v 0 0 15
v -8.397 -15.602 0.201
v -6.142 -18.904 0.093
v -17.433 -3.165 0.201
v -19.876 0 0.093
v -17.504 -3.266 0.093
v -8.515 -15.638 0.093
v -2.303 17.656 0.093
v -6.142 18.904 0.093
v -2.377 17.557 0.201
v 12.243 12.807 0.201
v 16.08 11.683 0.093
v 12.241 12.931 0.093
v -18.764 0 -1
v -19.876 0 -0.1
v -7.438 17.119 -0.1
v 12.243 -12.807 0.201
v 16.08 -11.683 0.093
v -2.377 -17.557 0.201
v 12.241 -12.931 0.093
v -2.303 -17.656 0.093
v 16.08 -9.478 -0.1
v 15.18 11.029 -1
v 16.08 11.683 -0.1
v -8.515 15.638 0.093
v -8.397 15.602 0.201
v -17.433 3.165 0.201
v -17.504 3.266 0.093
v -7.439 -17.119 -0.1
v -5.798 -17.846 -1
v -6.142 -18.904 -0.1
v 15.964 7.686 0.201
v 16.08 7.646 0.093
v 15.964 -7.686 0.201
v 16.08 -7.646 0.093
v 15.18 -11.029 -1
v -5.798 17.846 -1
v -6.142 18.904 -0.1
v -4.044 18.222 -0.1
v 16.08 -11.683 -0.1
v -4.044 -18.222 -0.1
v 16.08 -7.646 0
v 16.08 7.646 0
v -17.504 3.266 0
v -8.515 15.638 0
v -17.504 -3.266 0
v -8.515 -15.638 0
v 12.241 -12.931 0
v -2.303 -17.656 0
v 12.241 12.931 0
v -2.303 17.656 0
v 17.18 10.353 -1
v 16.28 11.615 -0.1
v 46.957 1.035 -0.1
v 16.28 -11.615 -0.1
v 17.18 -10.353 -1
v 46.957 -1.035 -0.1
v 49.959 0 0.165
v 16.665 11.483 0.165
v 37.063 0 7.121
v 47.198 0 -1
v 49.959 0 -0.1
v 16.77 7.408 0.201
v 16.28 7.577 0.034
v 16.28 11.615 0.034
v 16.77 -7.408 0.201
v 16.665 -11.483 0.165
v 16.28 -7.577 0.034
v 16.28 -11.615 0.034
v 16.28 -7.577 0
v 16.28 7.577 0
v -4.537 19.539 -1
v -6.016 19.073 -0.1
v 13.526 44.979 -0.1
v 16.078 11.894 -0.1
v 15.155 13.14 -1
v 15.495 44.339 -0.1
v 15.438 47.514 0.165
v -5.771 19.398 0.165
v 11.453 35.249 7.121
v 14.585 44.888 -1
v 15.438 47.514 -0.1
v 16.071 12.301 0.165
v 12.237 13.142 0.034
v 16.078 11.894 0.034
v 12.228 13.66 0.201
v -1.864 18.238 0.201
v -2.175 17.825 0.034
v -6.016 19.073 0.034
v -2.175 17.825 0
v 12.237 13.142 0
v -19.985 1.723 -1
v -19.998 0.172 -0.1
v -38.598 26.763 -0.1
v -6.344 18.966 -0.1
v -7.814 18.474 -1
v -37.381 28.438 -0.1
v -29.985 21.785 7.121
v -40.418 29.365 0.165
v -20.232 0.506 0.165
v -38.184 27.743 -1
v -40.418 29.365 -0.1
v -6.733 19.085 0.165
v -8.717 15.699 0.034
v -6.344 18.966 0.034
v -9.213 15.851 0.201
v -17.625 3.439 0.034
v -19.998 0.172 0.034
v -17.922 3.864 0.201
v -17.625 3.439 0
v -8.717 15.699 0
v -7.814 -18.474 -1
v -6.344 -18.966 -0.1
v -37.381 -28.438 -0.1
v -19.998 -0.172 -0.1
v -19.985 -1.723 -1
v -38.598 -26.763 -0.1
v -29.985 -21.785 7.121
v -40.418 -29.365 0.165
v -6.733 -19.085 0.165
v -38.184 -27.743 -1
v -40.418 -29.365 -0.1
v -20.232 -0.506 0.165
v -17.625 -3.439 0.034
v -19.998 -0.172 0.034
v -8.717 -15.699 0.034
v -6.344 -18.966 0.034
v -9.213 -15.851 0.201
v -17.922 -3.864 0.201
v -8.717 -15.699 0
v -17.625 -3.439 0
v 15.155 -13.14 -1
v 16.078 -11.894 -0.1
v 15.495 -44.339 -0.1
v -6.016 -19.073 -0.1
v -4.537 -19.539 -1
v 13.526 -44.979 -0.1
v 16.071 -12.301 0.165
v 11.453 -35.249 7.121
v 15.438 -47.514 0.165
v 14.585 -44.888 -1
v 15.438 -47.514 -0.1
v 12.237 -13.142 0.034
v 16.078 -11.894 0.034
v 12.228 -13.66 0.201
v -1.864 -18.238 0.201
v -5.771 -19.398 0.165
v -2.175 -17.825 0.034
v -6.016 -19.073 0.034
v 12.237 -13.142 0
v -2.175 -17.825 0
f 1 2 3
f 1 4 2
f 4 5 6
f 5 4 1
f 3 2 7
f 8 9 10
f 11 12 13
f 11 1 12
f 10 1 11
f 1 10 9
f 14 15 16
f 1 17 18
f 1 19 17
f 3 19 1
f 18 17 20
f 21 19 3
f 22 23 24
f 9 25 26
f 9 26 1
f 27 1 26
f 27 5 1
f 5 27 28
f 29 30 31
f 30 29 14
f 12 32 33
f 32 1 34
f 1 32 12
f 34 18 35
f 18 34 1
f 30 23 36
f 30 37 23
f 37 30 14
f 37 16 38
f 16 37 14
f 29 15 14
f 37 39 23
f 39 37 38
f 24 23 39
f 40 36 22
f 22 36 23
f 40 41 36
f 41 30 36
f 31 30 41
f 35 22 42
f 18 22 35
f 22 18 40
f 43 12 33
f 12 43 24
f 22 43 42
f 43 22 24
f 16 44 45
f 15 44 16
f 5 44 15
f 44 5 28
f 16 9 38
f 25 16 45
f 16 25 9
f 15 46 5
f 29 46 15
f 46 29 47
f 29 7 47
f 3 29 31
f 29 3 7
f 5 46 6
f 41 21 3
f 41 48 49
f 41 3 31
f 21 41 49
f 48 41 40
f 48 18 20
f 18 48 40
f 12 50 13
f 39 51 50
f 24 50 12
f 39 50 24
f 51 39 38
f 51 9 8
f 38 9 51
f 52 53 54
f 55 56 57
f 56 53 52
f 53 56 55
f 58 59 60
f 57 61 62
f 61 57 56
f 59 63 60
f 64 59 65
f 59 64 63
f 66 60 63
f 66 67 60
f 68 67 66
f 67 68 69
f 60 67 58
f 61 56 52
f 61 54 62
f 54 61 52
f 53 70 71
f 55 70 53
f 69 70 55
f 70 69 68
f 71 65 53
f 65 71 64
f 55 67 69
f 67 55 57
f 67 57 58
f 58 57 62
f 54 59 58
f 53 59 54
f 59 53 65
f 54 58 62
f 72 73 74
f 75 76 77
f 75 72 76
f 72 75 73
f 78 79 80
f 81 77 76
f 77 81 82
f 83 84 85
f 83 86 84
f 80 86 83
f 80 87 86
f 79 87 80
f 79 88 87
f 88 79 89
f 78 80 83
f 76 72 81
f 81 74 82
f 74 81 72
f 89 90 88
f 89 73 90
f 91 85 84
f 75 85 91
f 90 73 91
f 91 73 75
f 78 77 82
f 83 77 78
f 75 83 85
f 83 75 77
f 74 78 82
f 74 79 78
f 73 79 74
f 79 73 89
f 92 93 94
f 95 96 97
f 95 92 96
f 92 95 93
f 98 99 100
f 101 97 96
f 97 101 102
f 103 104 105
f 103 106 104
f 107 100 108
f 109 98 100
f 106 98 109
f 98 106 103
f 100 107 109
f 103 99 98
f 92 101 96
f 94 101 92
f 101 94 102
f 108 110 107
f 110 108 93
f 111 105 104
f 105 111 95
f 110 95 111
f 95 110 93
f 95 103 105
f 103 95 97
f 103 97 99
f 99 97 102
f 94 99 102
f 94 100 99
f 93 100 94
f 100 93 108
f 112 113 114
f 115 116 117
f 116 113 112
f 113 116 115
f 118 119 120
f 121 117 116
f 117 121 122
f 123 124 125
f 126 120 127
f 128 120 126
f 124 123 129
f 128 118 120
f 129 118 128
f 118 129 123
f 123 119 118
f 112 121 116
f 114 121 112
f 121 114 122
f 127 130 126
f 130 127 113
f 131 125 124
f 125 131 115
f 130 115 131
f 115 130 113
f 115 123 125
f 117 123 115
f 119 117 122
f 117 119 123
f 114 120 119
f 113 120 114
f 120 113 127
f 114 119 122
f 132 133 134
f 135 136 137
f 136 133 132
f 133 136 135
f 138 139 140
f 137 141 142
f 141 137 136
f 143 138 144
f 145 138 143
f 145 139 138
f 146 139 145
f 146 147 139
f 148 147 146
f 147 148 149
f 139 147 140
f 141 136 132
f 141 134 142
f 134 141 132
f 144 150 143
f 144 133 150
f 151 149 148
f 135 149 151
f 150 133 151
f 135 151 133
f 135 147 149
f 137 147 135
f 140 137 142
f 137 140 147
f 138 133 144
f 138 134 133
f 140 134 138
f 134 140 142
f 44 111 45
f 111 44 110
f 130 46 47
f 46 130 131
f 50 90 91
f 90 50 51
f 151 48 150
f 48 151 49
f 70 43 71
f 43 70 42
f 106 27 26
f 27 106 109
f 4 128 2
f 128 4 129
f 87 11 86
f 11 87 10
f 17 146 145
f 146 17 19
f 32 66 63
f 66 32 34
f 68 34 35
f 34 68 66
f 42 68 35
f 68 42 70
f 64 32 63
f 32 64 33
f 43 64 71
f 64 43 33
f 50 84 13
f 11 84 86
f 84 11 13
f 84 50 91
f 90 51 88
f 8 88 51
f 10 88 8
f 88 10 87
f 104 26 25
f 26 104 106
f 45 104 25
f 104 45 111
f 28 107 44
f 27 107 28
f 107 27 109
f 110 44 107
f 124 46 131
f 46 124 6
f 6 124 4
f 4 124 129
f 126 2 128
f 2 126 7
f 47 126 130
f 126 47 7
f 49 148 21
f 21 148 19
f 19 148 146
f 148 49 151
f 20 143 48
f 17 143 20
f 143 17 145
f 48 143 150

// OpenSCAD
// file pyramid_prism_net.scad
// creates 2D nets of pyramids and prisms
// (c) 2020 Rich Cameron
// released under a Creative Commons CC-BY 4.0 International License
r = 20; //radius, mm 
h = 30; //height
sides = 5;//number of faces on side of prism or pyramid (e.g. tetrahdron =3)
pyramid = true; //true gives a pyramid, false a prism
star = true; //true lays out net in star shape, false in linear 
linewidth = 0; // cut/fold line width for 2D export. Set to zero for 3D
baselayer = 1; // height of print below (outside) the hinges
printheight = 500; // total height to truncate the pyramidal sides
hinge = .201; // thickness of the hinges. Using a negative value will leave a gap

echo(str("surface area = ", (pyramid ? 1 : 2) * sides * r * sin(180 / sides) * r * cos(180 / sides) + sides * (pyramid ? h / sin(atan(h / (r * cos(180 / sides)))) : h * 2) * r * sin(180 / sides), "mm^2"));

module end(r, sides, a, offset = 0, extrude = false) {
	if(extrude) intersection() {
		hull() for(i = [0, 1]) translate([0, 0, i * -baselayer]) linear_extrude(h / 2, scale = 0) offset(i * -baselayer) end(r, sides, a);
		translate([0, 0, -baselayer]) linear_extrude(extrude) end(r, sides, a, offset);
	} else rotate(180 / sides) offset(offset) circle(r = r, $fn = sides);
}
module rect(h, r, a, offset = 0, extrude = false) {
	if(extrude) intersection() {
		hull() for(i = [0, 1]) translate([0, 0, i * -baselayer]) translate([-h / 2, 0, 0]) linear_extrude(r * cos(180 / sides), scale = 0) translate([h / 2, 0, 0]) offset(i * -baselayer) rect(h, r, a);
		translate([0, 0, -baselayer]) linear_extrude(extrude) rect(h, r, a, offset);
	} else offset(offset) translate([-h / 2, 0, 0]) square([h, 2 * r * sin(180 / sides)], center = true);
}
module tri(slant_h, h, r, a, offset = 0, extrude = false) {
	apex_l = sqrt(pow(r * cos(180 / sides), 2) + pow(h / 2, 2));
	apex_a = a - atan2(h / 2, r * cos(180 / sides));
	if(extrude) intersection() {
		hull() for(i = [0, 1]) translate([0, 0, i * -baselayer]) translate([-slant_h + apex_l * cos(apex_a), 0, 0]) linear_extrude(apex_l * sin(apex_a), scale = 0) translate([slant_h - apex_l * cos(apex_a), 0, 0]) offset(i * -baselayer) tri(slant_h, h, r, a);
		translate([0, 0, -baselayer]) linear_extrude(extrude) tri(slant_h, h, r, a, offset);
	}
	else offset(offset) scale([slant_h, r * sin(180 / sides), 1]) polygon([[-1, -1], [0, 0], [-1, 1]]);
}

module net(fold = false, pyramid = pyramid, r = r, h = h, sides = sides, star = star, offset = 0, extrude = linewidth ? 0 : printheight) {
	slant_a = pyramid ? atan(h / (r * cos(180 / sides))) : 90;
	slant_h = pyramid ? h / sin(slant_a) : h;
	
	end(r, sides, slant_a, offset, extrude);
	if(!pyramid) translate(fold ? [0, 0, h] : 2 * [r * cos(180 / sides) + h / 2, 0, 0]) rotate(fold ? [180, 0, 0] : 180) end(r, sides, slant_a, offset, extrude);
	for(i = [0:sides - 1]) rotate((star || fold) ? i * 360 / sides : 0) translate([r * cos(180 / sides), 0, 0]) rotate([0, fold ? slant_a - 180 : 0, 0]) translate([slant_h, 0, 0]) {
		if(pyramid) rotate((star || fold) ? 0 : (i - floor(sides / 2)) * atan((r * sin(180 / sides)) / slant_h) * 2) tri(slant_h, h, r, slant_a, offset, extrude);
		else translate([0, (star || fold) ? 0 : (i - floor(sides / 2)) * 2 * r * sin(180 / sides), 0]) rect(slant_h, r, 90, offset, extrude);
	}
	//echo(atan((r * sin(180 / sides)) / slant_h) * 2);
}

if(linewidth) difference() {
	net(offset = linewidth / 2);
	net(offset = -linewidth / 2);
} else {
	net(offset = min(-.1, hinge));
	if(hinge > 0) #linear_extrude(hinge) offset(-r * sin(180 / sides) / 3) net(offset = .001, extrude = 0);
}
%net(true);
	
/*for(i = [0:sides - 1]) rotate(i * 360 / sides) translate([r * cos(180 / sides), 0, 0]) rotate([0, slant_a - 180, 0]) translate([h / 2, 0, 0]) %offset(-.1) scale([h / 2, r * sin(180 / sides), 1]) {
	if(pyramid) polygon([[-1, -1], [2 * slant_h / h - 1, 0], [-1, 1]]);
	else square(2, center = true);
}

if(!pyramid) %translate([0, 0, h]) rotate(180 / sides) circle(r = r, $fn = sides);

%rotate(180 / sides) cylinder(r = r, h = h, $fn = sides);*/
